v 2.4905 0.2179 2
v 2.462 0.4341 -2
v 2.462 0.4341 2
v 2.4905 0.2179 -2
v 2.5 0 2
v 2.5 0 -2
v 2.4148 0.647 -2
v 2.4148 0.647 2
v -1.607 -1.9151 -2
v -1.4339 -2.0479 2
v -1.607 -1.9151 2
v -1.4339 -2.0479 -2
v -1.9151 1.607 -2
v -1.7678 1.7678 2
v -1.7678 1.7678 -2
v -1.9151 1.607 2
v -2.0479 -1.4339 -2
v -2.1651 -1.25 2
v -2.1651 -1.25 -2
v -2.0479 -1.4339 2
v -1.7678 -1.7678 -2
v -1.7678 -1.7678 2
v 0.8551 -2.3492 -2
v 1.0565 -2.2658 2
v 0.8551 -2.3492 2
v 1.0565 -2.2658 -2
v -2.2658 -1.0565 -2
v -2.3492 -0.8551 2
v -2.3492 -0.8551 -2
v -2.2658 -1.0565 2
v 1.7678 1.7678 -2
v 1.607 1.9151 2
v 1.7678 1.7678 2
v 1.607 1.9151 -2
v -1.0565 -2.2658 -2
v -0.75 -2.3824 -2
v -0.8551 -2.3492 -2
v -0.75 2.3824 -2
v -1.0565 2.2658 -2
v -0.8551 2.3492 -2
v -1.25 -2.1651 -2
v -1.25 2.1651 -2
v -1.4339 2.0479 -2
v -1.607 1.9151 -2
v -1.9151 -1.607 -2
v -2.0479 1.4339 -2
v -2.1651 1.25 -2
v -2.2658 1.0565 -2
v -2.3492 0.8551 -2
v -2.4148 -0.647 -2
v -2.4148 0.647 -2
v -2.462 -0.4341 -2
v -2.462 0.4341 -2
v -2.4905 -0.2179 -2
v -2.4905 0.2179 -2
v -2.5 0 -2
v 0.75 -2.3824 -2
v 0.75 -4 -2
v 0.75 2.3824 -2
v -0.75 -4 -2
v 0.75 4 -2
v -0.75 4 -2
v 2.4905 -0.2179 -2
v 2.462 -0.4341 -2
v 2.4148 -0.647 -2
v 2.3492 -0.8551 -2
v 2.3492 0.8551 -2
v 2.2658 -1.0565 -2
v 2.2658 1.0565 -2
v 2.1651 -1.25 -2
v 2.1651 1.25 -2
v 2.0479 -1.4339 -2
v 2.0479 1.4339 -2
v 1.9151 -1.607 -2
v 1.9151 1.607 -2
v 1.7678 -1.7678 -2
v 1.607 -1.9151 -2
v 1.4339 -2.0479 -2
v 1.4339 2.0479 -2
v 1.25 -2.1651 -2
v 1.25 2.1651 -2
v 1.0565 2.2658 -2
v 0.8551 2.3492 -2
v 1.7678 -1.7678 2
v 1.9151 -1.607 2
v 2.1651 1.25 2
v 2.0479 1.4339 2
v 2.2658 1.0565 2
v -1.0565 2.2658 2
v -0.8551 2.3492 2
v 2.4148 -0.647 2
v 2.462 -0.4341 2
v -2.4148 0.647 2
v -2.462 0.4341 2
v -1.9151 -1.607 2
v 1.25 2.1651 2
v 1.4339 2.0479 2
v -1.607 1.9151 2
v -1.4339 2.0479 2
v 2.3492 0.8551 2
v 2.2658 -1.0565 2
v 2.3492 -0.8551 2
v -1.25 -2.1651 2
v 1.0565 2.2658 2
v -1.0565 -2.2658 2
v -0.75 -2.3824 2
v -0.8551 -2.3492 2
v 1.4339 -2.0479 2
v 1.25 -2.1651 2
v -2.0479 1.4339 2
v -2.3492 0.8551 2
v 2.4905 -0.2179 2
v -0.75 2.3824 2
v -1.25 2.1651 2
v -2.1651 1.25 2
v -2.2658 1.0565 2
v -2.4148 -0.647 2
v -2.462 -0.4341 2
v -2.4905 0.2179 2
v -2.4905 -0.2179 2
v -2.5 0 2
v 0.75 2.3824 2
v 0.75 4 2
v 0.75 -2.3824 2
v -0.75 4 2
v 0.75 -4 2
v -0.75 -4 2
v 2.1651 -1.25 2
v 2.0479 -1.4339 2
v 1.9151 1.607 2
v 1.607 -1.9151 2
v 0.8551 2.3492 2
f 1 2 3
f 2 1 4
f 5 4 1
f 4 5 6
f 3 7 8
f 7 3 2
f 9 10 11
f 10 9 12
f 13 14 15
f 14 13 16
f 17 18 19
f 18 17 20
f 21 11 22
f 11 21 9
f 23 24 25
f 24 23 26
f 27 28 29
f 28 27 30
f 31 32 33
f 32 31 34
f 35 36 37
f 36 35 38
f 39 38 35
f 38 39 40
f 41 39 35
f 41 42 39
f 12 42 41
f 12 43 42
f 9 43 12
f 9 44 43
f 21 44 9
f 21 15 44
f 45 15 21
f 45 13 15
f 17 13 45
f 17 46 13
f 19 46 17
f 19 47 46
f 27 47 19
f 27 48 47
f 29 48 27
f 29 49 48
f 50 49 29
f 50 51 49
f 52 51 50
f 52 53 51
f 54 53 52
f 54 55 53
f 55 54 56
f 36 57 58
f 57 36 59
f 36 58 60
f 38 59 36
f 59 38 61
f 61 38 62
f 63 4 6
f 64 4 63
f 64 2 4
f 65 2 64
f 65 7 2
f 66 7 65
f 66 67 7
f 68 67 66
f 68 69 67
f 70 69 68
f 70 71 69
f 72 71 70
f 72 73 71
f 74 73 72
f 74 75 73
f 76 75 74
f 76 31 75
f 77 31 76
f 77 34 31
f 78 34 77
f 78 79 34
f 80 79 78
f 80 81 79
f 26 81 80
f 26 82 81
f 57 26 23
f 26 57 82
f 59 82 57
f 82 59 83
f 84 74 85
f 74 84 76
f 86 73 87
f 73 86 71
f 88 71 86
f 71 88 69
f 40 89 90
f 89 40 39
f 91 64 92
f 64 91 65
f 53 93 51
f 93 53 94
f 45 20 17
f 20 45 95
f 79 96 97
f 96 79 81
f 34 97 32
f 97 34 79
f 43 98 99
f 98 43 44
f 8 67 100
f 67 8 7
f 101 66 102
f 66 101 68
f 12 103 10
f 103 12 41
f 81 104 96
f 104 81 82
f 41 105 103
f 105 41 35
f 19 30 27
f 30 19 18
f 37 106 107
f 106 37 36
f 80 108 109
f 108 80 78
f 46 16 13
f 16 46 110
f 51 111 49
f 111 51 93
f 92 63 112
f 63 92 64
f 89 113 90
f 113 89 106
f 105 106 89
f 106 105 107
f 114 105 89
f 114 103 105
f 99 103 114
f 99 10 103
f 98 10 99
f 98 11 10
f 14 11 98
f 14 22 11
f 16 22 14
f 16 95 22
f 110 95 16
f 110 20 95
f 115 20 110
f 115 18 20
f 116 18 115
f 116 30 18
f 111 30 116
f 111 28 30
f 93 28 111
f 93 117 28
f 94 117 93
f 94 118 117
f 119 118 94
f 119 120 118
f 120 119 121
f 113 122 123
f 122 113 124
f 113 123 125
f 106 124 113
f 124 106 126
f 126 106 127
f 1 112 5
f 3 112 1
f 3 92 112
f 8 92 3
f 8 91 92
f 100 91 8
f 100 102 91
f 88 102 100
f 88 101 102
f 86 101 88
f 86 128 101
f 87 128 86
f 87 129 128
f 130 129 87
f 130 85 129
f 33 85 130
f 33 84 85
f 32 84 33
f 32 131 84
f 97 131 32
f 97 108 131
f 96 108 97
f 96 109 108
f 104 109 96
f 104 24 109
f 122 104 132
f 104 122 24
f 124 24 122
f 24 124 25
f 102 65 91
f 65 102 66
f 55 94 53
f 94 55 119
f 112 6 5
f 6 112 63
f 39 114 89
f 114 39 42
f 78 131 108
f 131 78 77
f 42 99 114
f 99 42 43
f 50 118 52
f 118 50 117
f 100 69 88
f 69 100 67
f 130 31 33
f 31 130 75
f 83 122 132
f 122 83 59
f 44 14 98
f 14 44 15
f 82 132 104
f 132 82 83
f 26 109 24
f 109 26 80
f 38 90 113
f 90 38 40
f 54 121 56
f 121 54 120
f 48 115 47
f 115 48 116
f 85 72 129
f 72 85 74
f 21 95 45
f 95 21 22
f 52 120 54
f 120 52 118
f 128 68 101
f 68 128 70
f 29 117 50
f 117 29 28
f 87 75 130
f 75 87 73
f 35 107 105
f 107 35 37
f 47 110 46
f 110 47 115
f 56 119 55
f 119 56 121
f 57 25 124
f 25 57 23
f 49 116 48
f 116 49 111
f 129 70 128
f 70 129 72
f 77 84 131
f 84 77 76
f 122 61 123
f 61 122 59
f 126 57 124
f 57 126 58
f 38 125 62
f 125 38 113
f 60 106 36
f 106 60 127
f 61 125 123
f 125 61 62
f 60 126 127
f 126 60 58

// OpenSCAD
$fa=5;$fs=0.1;


union() {
	cylinder(center = true, h = 4, r = 2.5000000000);
	cube(center = true, size = [1.5000000000, 8, 4]);
}
